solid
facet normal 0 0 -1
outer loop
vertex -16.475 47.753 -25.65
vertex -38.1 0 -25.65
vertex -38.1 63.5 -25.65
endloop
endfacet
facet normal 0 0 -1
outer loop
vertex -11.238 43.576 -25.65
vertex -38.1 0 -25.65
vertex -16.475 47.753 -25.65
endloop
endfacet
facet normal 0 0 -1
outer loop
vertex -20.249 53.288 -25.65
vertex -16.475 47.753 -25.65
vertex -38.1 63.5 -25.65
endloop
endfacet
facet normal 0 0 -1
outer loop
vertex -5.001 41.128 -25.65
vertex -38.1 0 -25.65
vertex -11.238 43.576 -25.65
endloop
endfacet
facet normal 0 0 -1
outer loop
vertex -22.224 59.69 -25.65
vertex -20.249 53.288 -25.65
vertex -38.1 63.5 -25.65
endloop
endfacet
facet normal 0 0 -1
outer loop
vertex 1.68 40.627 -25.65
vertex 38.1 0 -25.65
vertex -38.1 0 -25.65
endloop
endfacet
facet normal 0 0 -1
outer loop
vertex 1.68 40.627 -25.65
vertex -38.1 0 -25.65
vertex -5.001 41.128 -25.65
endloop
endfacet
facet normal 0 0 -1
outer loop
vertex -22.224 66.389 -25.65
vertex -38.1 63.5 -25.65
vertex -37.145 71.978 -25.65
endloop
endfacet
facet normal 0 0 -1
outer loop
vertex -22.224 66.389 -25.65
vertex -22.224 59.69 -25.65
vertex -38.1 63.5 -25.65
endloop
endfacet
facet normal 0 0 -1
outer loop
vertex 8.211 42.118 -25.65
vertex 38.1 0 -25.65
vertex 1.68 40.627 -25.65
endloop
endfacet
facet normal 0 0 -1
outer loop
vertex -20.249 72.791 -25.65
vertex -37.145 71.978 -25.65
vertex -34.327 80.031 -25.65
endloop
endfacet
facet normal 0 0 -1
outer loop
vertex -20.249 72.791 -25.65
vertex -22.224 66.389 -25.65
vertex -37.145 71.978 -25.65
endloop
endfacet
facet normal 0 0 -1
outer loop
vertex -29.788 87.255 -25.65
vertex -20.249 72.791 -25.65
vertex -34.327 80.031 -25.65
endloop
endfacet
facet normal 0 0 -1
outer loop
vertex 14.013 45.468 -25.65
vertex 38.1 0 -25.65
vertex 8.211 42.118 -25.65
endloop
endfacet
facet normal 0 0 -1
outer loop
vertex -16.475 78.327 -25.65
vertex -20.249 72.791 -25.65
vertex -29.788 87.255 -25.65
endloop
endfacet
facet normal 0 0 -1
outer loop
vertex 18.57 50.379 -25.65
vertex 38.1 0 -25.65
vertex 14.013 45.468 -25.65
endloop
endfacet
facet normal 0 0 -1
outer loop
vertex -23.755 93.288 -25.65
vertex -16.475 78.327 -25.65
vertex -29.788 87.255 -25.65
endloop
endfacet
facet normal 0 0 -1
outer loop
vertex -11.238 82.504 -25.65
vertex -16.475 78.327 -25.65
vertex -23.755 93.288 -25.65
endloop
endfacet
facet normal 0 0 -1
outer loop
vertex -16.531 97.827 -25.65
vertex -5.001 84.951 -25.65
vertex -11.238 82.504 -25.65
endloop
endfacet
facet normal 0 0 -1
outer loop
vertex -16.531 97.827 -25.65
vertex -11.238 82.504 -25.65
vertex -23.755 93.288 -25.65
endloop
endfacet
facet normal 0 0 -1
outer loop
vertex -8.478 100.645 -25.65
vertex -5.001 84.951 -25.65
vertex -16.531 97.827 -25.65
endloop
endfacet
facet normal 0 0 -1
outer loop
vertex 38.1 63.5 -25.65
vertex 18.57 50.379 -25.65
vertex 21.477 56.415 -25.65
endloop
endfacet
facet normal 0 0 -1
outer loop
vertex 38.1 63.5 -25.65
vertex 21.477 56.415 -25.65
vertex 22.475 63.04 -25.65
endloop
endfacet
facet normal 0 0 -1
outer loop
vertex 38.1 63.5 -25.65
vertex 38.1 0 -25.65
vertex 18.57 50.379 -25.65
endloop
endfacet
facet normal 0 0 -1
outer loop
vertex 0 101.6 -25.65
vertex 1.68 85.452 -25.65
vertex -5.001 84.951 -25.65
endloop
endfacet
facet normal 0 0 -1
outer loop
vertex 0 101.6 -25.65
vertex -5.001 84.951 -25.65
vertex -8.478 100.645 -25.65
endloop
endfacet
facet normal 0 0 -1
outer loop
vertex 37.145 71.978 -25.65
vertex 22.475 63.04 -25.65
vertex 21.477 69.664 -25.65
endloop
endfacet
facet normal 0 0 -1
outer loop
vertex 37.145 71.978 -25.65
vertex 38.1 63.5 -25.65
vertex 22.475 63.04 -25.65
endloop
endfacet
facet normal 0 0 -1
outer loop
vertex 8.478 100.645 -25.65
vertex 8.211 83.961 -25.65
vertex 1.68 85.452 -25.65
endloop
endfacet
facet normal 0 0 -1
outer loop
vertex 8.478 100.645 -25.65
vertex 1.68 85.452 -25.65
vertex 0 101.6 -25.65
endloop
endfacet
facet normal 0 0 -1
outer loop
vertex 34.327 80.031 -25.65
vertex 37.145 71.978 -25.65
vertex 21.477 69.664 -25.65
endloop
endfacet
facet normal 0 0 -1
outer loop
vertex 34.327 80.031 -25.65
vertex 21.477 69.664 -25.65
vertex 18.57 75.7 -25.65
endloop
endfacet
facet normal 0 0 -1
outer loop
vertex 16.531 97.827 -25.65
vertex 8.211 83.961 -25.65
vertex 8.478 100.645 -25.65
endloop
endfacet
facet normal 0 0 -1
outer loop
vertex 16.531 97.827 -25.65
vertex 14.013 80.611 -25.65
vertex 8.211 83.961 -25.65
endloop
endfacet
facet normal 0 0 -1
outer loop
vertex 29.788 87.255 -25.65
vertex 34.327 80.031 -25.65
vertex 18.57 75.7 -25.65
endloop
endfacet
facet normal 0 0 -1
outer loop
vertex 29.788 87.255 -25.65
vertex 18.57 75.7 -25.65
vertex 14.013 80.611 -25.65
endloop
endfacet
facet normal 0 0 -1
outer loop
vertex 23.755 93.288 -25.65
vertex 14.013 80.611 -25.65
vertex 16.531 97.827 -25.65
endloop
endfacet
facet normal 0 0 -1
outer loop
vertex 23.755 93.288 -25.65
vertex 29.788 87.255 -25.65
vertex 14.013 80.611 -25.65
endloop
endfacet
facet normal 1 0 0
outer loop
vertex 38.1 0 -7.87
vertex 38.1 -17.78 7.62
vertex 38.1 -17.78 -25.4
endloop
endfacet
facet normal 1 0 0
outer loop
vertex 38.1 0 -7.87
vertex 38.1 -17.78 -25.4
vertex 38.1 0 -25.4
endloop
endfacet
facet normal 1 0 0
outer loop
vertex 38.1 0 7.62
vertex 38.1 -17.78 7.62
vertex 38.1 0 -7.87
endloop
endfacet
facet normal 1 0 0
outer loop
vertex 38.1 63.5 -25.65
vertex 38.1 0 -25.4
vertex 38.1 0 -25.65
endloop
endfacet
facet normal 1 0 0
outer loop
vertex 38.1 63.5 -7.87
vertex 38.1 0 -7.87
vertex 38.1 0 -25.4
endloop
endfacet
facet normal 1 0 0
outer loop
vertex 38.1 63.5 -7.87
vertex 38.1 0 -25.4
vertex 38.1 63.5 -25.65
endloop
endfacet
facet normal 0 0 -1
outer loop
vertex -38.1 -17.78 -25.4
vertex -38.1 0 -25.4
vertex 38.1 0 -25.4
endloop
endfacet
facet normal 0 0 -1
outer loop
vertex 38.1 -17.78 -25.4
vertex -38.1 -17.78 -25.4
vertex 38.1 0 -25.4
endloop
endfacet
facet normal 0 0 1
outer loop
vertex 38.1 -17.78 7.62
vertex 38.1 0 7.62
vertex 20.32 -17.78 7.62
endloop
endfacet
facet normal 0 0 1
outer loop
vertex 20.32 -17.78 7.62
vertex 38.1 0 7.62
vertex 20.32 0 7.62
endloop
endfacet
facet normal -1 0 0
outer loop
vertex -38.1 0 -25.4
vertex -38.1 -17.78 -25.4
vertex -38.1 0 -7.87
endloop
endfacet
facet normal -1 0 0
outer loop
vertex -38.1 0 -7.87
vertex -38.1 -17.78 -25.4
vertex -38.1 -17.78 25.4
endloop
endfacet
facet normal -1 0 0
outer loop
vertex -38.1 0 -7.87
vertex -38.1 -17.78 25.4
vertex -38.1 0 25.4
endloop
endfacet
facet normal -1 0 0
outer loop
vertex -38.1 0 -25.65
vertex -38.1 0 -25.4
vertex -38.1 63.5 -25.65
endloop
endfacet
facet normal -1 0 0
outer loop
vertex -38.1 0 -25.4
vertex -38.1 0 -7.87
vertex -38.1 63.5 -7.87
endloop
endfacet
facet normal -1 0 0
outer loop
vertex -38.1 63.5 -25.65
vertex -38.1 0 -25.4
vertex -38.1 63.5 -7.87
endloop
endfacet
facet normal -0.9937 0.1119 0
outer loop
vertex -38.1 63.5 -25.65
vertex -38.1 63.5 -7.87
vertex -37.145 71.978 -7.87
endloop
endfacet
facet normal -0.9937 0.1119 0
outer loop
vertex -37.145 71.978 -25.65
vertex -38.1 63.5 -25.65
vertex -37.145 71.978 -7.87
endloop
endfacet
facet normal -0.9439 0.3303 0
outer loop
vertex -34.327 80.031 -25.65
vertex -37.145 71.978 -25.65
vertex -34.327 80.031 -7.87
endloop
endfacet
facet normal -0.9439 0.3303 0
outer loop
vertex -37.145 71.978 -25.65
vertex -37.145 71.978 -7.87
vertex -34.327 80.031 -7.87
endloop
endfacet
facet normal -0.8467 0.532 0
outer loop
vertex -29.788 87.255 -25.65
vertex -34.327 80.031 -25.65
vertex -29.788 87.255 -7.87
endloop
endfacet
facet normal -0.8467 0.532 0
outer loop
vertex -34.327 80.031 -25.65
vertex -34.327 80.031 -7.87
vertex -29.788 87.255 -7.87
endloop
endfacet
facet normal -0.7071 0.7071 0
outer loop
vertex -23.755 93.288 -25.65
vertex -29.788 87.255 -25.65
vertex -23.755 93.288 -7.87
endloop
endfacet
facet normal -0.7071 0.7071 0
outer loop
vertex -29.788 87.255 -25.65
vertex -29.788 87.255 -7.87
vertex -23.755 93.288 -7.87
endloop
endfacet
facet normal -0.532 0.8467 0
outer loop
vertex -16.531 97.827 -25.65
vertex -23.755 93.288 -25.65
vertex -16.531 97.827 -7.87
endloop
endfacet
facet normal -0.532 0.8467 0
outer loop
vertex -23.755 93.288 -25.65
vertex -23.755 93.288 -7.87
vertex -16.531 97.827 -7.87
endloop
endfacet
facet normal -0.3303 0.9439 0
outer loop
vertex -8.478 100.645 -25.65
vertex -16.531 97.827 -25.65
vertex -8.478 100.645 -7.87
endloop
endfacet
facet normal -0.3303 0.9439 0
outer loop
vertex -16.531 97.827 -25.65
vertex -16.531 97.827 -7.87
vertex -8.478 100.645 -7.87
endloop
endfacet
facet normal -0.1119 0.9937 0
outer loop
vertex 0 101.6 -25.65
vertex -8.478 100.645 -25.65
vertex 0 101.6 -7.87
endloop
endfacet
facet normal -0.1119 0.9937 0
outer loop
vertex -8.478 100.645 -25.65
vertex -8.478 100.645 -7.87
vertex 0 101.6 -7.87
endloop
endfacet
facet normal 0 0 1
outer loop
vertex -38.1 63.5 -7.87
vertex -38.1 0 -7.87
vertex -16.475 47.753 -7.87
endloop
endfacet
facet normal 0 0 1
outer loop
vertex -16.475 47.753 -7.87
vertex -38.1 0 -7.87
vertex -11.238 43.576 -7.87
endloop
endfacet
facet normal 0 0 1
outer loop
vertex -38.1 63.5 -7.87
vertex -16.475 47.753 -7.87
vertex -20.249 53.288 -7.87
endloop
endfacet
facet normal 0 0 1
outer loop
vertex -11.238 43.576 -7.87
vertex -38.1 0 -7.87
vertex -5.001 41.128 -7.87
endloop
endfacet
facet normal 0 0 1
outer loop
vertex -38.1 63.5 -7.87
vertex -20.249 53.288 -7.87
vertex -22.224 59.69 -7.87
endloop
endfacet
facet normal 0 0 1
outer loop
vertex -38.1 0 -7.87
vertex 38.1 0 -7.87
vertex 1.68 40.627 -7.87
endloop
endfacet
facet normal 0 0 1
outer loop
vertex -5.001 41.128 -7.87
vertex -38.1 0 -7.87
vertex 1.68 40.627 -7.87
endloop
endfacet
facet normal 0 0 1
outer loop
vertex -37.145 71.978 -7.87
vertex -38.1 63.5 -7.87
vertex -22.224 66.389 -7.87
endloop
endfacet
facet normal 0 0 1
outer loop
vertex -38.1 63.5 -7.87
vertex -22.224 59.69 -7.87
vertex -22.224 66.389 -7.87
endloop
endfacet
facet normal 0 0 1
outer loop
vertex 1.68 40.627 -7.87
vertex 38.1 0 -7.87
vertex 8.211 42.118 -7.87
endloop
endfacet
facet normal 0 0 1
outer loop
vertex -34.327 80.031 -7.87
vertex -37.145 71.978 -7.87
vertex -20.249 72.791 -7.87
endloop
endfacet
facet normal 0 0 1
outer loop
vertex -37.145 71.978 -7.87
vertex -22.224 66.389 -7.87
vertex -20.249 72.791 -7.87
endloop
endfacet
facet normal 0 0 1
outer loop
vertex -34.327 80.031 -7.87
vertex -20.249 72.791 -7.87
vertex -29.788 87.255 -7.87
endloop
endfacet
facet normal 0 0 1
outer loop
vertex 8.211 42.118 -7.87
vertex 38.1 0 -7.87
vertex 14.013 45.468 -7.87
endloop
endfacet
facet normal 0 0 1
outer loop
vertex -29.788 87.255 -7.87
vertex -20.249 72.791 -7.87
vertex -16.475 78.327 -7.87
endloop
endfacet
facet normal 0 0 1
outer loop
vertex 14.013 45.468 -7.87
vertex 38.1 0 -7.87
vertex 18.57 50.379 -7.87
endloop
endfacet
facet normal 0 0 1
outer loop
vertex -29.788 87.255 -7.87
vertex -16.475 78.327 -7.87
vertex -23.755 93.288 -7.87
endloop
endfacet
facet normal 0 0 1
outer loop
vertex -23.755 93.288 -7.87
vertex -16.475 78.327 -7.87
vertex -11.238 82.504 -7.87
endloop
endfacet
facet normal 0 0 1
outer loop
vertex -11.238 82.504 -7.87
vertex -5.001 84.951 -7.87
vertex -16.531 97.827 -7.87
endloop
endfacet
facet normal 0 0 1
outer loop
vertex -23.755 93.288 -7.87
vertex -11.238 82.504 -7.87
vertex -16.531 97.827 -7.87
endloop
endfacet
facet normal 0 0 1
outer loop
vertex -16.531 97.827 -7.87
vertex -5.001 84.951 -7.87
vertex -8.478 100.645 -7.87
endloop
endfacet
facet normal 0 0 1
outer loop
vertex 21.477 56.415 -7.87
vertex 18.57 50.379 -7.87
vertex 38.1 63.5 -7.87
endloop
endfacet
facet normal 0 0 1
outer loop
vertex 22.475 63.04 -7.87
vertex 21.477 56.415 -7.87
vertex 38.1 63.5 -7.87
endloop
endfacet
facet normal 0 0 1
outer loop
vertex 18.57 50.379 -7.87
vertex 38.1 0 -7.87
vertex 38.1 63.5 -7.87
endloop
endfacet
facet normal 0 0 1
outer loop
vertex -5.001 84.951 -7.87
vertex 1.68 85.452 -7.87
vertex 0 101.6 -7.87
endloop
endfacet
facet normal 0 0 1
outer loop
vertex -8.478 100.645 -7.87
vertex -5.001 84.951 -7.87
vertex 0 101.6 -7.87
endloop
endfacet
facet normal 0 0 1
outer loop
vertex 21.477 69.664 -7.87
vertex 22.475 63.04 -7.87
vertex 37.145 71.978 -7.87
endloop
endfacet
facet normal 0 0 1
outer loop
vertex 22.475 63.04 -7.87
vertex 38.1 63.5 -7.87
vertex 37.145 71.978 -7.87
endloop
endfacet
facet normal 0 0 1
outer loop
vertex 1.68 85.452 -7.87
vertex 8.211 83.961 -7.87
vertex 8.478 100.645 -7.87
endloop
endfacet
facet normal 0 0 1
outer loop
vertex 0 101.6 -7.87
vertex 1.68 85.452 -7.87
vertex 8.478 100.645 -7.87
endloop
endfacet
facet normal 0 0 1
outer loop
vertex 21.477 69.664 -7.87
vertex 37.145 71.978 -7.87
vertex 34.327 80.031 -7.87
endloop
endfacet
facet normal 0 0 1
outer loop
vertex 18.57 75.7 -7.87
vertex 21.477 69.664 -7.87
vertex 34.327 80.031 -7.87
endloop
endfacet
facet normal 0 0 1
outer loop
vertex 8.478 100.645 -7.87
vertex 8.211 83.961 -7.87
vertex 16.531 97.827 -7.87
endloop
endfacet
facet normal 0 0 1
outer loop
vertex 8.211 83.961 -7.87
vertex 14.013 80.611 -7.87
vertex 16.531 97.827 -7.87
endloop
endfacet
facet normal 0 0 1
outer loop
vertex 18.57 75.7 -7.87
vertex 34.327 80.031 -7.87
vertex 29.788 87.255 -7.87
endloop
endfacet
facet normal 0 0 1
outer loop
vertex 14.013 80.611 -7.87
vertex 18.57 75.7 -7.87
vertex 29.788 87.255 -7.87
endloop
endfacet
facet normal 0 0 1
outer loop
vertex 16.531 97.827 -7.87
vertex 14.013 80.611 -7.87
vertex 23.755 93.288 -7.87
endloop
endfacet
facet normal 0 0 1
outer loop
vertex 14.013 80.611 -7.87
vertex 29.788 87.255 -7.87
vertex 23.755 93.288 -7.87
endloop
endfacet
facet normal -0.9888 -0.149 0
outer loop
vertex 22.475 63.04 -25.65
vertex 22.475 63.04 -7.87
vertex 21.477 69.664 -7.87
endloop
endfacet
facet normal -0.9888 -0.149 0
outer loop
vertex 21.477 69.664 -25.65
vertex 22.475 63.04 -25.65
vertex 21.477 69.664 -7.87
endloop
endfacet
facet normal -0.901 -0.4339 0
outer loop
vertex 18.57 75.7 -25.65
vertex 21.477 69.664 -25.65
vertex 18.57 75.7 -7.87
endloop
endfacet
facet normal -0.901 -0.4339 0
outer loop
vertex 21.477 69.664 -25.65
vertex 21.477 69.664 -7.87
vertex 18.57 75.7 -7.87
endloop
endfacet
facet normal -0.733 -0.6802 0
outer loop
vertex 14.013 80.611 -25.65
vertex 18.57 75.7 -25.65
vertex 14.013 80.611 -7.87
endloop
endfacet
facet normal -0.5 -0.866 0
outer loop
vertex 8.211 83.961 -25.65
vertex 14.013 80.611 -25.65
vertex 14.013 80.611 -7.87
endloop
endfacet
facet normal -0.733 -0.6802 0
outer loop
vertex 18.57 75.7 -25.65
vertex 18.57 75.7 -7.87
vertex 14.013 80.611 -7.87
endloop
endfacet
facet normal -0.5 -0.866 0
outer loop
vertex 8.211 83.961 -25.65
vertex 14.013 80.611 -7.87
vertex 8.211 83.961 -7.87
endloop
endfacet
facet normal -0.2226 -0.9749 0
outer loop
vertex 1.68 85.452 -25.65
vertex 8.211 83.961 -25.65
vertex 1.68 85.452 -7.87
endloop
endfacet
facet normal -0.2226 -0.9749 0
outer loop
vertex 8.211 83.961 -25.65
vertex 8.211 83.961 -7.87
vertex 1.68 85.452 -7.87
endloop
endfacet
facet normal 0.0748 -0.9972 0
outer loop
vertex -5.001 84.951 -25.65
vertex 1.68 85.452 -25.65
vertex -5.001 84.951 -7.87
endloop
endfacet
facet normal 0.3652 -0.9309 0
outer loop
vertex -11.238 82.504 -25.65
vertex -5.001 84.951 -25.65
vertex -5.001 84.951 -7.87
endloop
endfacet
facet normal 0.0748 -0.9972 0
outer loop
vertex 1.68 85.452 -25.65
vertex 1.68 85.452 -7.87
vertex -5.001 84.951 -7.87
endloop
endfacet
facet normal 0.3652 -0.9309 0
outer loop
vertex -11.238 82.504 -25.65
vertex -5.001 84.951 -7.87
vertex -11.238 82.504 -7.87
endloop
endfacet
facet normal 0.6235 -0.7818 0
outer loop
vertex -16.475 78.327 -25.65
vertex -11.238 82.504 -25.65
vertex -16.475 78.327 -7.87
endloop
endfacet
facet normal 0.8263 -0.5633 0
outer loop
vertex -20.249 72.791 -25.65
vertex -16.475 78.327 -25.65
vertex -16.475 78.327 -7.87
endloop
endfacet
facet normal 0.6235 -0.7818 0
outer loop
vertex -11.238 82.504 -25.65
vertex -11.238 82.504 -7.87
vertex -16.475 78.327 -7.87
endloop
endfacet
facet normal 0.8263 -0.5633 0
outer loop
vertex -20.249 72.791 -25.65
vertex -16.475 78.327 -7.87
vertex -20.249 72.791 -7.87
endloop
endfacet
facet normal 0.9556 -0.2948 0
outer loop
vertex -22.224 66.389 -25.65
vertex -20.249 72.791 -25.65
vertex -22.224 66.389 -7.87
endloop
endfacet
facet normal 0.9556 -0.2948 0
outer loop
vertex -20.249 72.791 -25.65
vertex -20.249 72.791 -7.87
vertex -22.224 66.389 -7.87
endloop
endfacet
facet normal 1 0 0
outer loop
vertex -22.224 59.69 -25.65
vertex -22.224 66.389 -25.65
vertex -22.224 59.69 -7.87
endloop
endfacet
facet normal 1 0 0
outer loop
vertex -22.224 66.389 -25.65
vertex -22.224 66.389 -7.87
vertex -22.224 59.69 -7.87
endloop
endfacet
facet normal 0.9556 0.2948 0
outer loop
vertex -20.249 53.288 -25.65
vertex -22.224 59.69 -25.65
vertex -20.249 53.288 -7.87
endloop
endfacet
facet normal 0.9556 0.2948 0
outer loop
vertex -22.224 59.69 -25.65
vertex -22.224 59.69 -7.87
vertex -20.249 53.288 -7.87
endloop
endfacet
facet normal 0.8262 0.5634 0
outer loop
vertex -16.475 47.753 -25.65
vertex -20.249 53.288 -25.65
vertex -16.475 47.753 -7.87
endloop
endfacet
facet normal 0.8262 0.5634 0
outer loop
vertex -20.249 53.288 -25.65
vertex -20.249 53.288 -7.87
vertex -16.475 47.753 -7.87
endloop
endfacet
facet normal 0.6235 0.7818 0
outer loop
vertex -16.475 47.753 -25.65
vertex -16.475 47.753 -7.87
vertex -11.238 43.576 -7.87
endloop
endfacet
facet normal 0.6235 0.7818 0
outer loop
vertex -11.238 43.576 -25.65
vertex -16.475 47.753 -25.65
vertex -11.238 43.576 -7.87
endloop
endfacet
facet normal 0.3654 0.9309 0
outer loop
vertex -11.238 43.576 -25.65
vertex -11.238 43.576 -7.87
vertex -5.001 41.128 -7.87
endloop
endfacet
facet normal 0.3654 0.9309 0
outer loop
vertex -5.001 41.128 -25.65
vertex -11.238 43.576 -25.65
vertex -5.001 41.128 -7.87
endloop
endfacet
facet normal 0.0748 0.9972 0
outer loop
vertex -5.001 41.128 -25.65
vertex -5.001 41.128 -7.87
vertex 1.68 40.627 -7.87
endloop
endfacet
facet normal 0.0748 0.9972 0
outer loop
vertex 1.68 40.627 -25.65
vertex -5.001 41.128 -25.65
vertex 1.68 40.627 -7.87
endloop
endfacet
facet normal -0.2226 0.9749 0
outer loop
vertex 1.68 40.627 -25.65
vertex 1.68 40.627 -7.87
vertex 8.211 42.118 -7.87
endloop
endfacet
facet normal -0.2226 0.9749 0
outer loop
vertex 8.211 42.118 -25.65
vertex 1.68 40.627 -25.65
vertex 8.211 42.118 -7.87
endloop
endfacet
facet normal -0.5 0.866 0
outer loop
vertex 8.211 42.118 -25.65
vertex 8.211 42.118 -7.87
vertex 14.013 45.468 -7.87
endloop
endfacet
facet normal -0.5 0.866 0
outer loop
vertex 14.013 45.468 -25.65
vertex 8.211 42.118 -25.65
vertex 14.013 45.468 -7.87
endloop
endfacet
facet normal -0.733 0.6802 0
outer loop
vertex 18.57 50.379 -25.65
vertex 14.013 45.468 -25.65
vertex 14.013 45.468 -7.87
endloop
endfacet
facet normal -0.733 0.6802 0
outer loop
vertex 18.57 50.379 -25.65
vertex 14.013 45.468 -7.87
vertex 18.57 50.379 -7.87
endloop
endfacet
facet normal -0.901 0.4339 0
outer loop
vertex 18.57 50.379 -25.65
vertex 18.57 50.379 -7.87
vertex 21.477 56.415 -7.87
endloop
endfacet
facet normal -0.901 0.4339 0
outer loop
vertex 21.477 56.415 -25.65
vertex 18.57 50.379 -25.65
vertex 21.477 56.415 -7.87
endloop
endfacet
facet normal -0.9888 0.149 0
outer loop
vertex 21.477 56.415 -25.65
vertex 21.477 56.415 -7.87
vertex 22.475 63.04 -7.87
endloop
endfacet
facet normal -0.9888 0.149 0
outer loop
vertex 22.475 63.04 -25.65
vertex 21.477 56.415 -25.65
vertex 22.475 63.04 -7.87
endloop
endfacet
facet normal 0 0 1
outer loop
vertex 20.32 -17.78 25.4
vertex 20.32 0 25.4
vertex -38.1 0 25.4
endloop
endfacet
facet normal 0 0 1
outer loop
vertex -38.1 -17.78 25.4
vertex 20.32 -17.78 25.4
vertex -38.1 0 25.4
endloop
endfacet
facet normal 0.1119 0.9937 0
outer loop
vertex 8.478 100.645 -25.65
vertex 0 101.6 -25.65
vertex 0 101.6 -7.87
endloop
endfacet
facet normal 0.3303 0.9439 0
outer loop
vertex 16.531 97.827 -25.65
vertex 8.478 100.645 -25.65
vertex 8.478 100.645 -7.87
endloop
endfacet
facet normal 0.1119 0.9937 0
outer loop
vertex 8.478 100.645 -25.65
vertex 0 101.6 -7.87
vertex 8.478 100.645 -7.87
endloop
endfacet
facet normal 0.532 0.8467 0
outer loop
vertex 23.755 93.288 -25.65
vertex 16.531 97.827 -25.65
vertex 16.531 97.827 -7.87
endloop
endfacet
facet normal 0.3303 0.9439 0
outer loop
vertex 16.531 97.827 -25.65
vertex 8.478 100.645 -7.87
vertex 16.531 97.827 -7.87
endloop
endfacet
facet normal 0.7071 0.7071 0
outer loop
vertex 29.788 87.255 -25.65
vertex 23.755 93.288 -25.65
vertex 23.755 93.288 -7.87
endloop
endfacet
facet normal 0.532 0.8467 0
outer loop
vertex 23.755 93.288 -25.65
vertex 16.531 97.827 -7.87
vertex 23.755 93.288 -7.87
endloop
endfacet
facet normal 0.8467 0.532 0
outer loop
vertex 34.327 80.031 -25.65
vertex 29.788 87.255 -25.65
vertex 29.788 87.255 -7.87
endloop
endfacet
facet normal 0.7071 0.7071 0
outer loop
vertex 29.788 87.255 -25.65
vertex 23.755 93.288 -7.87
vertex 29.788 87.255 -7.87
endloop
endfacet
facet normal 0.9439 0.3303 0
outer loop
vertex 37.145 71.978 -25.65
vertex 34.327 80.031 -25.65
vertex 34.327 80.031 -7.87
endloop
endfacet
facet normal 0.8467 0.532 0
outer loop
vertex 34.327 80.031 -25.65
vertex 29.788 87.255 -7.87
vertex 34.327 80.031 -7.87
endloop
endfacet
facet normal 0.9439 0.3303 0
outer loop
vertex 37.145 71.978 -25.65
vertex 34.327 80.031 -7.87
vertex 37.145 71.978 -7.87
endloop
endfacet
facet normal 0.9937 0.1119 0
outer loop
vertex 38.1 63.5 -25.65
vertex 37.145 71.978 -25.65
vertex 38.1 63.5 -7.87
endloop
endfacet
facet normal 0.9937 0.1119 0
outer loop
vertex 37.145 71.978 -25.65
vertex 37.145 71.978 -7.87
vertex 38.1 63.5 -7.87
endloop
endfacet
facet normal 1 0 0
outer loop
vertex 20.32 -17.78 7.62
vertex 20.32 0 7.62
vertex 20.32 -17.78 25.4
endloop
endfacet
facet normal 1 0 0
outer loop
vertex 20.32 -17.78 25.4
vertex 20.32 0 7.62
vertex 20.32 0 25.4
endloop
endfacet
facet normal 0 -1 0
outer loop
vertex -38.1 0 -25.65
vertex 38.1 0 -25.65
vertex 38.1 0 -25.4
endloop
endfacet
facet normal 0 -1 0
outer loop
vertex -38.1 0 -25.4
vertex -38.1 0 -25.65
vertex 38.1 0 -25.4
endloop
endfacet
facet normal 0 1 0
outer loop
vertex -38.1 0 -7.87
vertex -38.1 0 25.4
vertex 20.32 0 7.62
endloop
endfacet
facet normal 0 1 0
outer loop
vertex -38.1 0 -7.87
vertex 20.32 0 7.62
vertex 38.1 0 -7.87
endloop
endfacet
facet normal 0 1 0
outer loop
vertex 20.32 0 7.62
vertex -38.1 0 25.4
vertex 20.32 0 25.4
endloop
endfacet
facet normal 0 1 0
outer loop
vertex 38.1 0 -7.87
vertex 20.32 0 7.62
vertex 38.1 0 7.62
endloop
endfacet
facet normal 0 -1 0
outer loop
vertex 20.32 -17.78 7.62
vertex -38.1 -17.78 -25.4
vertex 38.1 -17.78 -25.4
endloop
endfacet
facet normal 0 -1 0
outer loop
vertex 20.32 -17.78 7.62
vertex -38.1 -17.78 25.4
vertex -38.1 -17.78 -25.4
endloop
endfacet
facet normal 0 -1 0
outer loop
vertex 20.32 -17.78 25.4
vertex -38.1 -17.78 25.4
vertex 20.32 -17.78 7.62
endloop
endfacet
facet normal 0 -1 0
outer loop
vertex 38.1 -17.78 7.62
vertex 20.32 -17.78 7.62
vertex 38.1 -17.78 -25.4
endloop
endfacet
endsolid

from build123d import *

# Parameters (mm, degrees)
F1_DEPTH = 17.78
F2_W     = 101.6
F2_H     = 17.78
F3_DEPTH = 38.1
F4_DEPTH = 38.1
F6_R     = 22.4750173509
F7_DEPTH = 50.8
F8_DEPTH = 50.8
F9_DEPTH = 50.8


with BuildPart() as f1:
    # F0 (on Front) → F1 (new body)
    with BuildSketch(Plane.XZ):
        Polygon((-38.1, -25.4), (38.1, -25.4), (38.1, 7.62), (20.32, 7.62), (20.32, 25.4), (-38.1, 25.4), align=None)
    extrude(amount=F1_DEPTH)

    # F2 (on Right) → F3 (join)
    with BuildSketch(Plane.YZ):
        with Locations((50.8, -16.759835723)):
            Rectangle(F2_W, F2_H)
    extrude(amount=F3_DEPTH)

    # F4 (add): a face of the model
    f4_faces = [f1.faces().sort_by_distance(p)[0] for p in [
        (0, 50.8, -16.759835723),
    ]]
    extrude(f4_faces, amount=F4_DEPTH)

    # F6 (on Top) → F7 (cut)
    with BuildSketch(Plane.XY):
        with Locations((0, 63.0396232009)):
            Circle(F6_R)
    extrude(amount=-F7_DEPTH, mode=Mode.SUBTRACT)

    # F5 (on face) → F8 (cut)
    with BuildSketch(Plane.XY.offset(-7.869835723)):
        with BuildLine():
            ThreePointArc((1.241e-07, 101.6), (26.9407684071, 90.4407683193), (38.1, 63.5))
            Line((38.1, 63.5), (38.1, 101.6))
            Line((38.1, 101.6), (1.241e-07, 101.6))
        make_face()
    extrude(amount=-F8_DEPTH, mode=Mode.SUBTRACT)

    # F5 (on face) → F9 (cut)
    with BuildSketch(Plane.XY.offset(-7.869835723)):
        with BuildLine():
            ThreePointArc((-38.1, 63.5), (-26.9407683193, 90.4407684071), (1.241e-07, 101.6))
            Line((1.241e-07, 101.6), (-38.1, 101.6))
            Line((-38.1, 101.6), (-38.1, 63.5))
        make_face()
    extrude(amount=-F9_DEPTH, mode=Mode.SUBTRACT)


solid = f1.part
